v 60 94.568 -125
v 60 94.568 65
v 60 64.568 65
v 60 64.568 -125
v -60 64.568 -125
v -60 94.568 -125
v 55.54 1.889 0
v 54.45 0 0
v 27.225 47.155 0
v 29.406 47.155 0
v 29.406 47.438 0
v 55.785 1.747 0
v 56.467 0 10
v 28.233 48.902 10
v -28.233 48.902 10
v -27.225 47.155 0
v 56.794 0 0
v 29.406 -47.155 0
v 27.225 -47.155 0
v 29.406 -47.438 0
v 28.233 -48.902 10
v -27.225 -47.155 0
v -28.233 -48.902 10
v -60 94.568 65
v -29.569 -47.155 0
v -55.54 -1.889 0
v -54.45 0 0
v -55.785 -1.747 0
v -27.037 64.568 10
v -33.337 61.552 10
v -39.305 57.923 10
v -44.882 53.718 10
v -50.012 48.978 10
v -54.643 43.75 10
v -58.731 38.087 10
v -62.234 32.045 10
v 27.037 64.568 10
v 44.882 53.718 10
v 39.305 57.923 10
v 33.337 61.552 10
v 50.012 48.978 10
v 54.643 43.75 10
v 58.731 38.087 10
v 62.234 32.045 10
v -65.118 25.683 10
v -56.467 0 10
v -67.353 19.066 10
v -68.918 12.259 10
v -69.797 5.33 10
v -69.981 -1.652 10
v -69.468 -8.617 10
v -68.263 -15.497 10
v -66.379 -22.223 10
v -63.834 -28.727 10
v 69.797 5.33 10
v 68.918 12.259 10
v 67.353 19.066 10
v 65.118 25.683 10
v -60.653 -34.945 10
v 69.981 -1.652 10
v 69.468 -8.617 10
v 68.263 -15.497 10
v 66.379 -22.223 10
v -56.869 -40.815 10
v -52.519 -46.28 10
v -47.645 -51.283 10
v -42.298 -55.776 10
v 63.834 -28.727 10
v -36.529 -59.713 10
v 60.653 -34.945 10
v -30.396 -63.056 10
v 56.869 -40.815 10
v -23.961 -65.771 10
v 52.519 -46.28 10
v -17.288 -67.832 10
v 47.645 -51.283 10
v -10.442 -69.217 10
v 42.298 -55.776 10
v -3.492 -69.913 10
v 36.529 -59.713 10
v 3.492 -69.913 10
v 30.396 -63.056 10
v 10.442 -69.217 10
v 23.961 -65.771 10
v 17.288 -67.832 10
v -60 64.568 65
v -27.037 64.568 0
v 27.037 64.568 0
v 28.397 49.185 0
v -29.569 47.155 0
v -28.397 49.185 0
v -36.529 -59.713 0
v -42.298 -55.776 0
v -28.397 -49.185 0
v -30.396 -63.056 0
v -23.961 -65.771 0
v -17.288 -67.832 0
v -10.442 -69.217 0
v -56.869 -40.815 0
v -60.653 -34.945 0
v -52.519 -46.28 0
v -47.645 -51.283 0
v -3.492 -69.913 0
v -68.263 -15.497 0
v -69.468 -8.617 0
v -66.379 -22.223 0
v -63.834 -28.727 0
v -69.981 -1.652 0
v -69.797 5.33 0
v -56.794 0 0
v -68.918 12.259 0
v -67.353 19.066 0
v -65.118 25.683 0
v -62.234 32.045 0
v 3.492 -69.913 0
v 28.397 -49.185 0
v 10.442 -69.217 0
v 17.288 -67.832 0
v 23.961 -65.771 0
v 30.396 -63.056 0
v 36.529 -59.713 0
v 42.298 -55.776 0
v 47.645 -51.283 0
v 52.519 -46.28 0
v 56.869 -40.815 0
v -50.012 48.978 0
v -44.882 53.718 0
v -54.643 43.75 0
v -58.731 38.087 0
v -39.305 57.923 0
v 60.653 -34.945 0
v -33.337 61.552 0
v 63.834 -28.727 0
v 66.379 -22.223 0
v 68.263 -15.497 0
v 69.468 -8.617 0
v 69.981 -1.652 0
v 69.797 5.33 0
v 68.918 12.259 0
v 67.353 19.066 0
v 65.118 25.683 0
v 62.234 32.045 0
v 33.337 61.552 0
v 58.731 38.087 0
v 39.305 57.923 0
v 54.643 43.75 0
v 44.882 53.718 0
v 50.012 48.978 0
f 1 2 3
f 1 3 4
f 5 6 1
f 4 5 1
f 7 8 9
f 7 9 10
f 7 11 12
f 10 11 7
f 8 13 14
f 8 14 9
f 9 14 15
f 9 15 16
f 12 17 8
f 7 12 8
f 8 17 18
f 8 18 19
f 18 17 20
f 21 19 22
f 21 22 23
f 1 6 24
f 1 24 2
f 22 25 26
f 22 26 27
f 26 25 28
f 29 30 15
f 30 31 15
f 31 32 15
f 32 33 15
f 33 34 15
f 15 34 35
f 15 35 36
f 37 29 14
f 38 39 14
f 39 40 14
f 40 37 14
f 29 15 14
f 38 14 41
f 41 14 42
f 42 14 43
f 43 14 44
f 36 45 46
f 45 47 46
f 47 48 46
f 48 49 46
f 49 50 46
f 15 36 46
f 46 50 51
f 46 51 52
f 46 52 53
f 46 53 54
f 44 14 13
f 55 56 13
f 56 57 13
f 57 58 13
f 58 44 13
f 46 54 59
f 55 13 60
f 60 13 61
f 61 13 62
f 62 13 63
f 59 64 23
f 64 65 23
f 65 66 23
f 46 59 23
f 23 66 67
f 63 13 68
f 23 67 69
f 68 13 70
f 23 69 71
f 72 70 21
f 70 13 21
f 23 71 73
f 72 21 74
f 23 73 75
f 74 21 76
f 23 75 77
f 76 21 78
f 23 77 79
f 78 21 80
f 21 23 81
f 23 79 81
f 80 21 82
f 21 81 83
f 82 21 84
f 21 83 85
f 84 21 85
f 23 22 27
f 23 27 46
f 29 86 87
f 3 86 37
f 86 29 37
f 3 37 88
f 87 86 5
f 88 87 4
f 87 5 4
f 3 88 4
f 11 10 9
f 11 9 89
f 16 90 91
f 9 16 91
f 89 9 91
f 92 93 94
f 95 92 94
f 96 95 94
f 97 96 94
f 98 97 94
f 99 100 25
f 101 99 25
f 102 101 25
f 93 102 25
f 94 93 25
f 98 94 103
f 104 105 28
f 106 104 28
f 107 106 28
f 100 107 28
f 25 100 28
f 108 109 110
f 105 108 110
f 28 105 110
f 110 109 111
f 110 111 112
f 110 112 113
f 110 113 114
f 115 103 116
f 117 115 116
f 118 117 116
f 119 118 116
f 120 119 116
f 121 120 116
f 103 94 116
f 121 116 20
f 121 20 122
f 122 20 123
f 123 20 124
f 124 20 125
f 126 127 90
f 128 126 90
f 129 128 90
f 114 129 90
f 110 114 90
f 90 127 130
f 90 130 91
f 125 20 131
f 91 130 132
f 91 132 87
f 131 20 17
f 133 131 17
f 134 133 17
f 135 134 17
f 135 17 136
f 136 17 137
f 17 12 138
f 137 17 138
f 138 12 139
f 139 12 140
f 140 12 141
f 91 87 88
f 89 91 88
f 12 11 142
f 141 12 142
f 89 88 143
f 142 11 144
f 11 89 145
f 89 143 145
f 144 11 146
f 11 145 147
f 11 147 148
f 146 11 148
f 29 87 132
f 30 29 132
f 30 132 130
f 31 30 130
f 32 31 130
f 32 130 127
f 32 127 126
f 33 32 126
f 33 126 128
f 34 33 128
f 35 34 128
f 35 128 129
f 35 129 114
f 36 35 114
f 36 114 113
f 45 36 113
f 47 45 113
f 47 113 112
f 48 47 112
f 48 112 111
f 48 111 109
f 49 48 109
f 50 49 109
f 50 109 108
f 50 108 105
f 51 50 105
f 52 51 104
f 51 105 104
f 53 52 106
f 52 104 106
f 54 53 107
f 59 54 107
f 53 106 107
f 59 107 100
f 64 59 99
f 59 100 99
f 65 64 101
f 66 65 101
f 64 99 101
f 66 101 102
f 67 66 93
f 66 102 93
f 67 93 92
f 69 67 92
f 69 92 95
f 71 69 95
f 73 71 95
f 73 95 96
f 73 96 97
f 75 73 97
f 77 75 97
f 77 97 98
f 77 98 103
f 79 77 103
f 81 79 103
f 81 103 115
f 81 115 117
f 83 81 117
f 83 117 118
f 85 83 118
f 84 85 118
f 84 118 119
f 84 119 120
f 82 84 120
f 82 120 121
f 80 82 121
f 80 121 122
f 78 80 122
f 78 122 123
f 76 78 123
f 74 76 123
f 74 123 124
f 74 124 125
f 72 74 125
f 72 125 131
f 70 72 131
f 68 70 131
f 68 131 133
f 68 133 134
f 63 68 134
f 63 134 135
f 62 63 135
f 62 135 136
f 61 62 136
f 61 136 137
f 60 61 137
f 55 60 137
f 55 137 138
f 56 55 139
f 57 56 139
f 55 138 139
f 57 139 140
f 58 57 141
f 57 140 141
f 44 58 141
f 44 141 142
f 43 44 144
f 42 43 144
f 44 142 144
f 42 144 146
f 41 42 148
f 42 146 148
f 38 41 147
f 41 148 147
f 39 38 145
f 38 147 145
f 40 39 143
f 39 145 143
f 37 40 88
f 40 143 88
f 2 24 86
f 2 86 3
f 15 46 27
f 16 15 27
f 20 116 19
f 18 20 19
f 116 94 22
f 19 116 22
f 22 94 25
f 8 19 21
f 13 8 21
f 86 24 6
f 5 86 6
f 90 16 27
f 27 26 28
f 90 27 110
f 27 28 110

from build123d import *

# Parameters (mm, degrees)
ESQUISSE1_R               = 70
BOSS_EXTRU_1_DEPTH        = 10
CHANFREIN1_SIZE           = 10.000000024
CHANFREIN1_SIZE_2         = 1.74707794
D_PLACER_START            = -32.160153846
D_PLACER_LA_FACE1_DEPTH   = 61.565802755
D_PLACER_START_2          = -29.405648909
D_PLACER_LA_FACE1_2_DEPTH = 58.811297818
D_PLACER_LA_FACE1_3_DEPTH = 58.811297818
ESQUISSE2_W               = 120
ESQUISSE2_H               = 190
BOSS_EXTRU_2_DEPTH        = 30


with BuildPart() as part:
    # Esquisse1 → Boss.-Extru.1 (new body)
    with BuildSketch(Plane.XY):
        Circle(ESQUISSE1_R)
        Polygon((56.79394598, 0), (28.39697299, 49.185), (-28.39697299, 49.185), (-56.79394598, 0), (-28.39697299, -49.185), (28.39697299, -49.185), align=None, mode=Mode.SUBTRACT)
    extrude(amount=BOSS_EXTRU_1_DEPTH)

    # Chanfrein1
    # the kernel refuses this chamfer: 10.000000024, 1.74707794 mm, written as the material it takes off along each edge
    with BuildSketch(Plane(origin=(-54.38262227, -49.185, 10), x_dir=(0, 0, -1), z_dir=(1, 0, 0))) as chanfrein1_piece_1_section:
        Polygon((CHANFREIN1_SIZE, 0), (0, -CHANFREIN1_SIZE_2), (0, 0), align=None)
    chanfrein1_piece_1 = extrude(amount=108.76524454, mode=Mode.PRIVATE)
    chanfrein1_piece_1 = split(chanfrein1_piece_1, bisect_by=Plane(origin=(7.702074175, -85.029616205, 10), z_dir=(-0.8660254037844389, 0.4999999999999996, 0)), keep=Keep.TOP, mode=Mode.PRIVATE)
    chanfrein1_piece_1 = split(chanfrein1_piece_1, bisect_by=Plane(origin=(-34.89338531, -37.932883795, 10), z_dir=(0.8660254037844386, 0.5000000000000001, 0)), keep=Keep.TOP, mode=Mode.PRIVATE)
    add(chanfrein1_piece_1, mode=Mode.SUBTRACT)
    with BuildSketch(Plane(origin=(15.40414835, -71.68923241, 10), x_dir=(0, 0, -1), z_dir=(0.4999999999999996, 0.8660254037844389, 0))) as chanfrein1_piece_2_section:
        Polygon((CHANFREIN1_SIZE, 0), (0, -CHANFREIN1_SIZE_2), (0, 0), align=None)
    chanfrein1_piece_2 = extrude(amount=108.76524454, mode=Mode.PRIVATE)
    chanfrein1_piece_2 = split(chanfrein1_piece_2, bisect_by=Plane(origin=(15.40414835, -49.185, 10), z_dir=(0, 1, 0)), keep=Keep.TOP, mode=Mode.PRIVATE)
    chanfrein1_piece_2 = split(chanfrein1_piece_2, bisect_by=Plane(origin=(77.488844795, -35.844616205, 10), z_dir=(-0.8660254037844386, -0.5000000000000001, 0)), keep=Keep.TOP, mode=Mode.PRIVATE)
    add(chanfrein1_piece_2, mode=Mode.SUBTRACT)
    with BuildSketch(Plane(origin=(69.78677062, -22.50423241, 10), x_dir=(0, 0, -1), z_dir=(-0.5000000000000001, 0.8660254037844386, 0))) as chanfrein1_piece_3_section:
        Polygon((CHANFREIN1_SIZE, 0), (0, -CHANFREIN1_SIZE_2), (0, 0), align=None)
    chanfrein1_piece_3 = extrude(amount=108.76524454, mode=Mode.PRIVATE)
    chanfrein1_piece_3 = split(chanfrein1_piece_3, bisect_by=Plane(origin=(50.29753366, -11.252116205, 10), z_dir=(-0.8660254037844389, 0.4999999999999996, 0)), keep=Keep.TOP, mode=Mode.PRIVATE)
    chanfrein1_piece_3 = split(chanfrein1_piece_3, bisect_by=Plane(origin=(69.78677062, 49.185, 10), z_dir=(0, -1, 0)), keep=Keep.TOP, mode=Mode.PRIVATE)
    add(chanfrein1_piece_3, mode=Mode.SUBTRACT)
    with BuildSketch(Plane(origin=(54.38262227, 49.185, 10), x_dir=(0, 0, -1), z_dir=(-1, 0, 0))) as chanfrein1_piece_4_section:
        Polygon((CHANFREIN1_SIZE, 0), (0, -CHANFREIN1_SIZE_2), (0, 0), align=None)
    chanfrein1_piece_4 = extrude(amount=108.76524454, mode=Mode.PRIVATE)
    chanfrein1_piece_4 = split(chanfrein1_piece_4, bisect_by=Plane(origin=(-7.702074175, 85.029616205, 10), z_dir=(0.8660254037844388, -0.4999999999999998, 0)), keep=Keep.TOP, mode=Mode.PRIVATE)
    chanfrein1_piece_4 = split(chanfrein1_piece_4, bisect_by=Plane(origin=(34.89338531, 37.932883795, 10), z_dir=(-0.8660254037844386, -0.5000000000000001, 0)), keep=Keep.TOP, mode=Mode.PRIVATE)
    add(chanfrein1_piece_4, mode=Mode.SUBTRACT)
    with BuildSketch(Plane(origin=(-15.40414835, 71.68923241, 10), x_dir=(0, 0, -1), z_dir=(-0.4999999999999998, -0.8660254037844388, 0))) as chanfrein1_piece_5_section:
        Polygon((CHANFREIN1_SIZE, 0), (0, -CHANFREIN1_SIZE_2), (0, 0), align=None)
    chanfrein1_piece_5 = extrude(amount=108.76524454, mode=Mode.PRIVATE)
    chanfrein1_piece_5 = split(chanfrein1_piece_5, bisect_by=Plane(origin=(-77.488844795, 35.844616205, 10), z_dir=(0.8660254037844386, 0.5000000000000001, 0)), keep=Keep.TOP, mode=Mode.PRIVATE)
    chanfrein1_piece_5 = split(chanfrein1_piece_5, bisect_by=Plane(origin=(-15.40414835, 49.185, 10), z_dir=(0, -1, 0)), keep=Keep.TOP, mode=Mode.PRIVATE)
    add(chanfrein1_piece_5, mode=Mode.SUBTRACT)
    with BuildSketch(Plane(origin=(-69.78677062, 22.50423241, 10), x_dir=(0, 0, -1), z_dir=(0.5000000000000001, -0.8660254037844386, 0))) as chanfrein1_piece_6_section:
        Polygon((CHANFREIN1_SIZE, 0), (0, -CHANFREIN1_SIZE_2), (0, 0), align=None)
    chanfrein1_piece_6 = extrude(amount=108.76524454, mode=Mode.PRIVATE)
    chanfrein1_piece_6 = split(chanfrein1_piece_6, bisect_by=Plane(origin=(-69.78677062, -49.185, 10), z_dir=(0, 1, 0)), keep=Keep.TOP, mode=Mode.PRIVATE)
    chanfrein1_piece_6 = split(chanfrein1_piece_6, bisect_by=Plane(origin=(-50.29753366, 11.252116205, 10), z_dir=(0.8660254037844388, -0.4999999999999998, 0)), keep=Keep.TOP, mode=Mode.PRIVATE)
    add(chanfrein1_piece_6, mode=Mode.SUBTRACT)
    with BuildSketch(Plane(origin=(-54.38262227, -49.185, 10), x_dir=(0, 0, -1), z_dir=(1, 0, 0))) as chanfrein1_piece_7a_section:
        Polygon((CHANFREIN1_SIZE, 0), (0, -CHANFREIN1_SIZE_2), (0, 0), align=None)
    chanfrein1_piece_7a = extrude(amount=108.76524454, mode=Mode.PRIVATE)
    chanfrein1_piece_7a = split(chanfrein1_piece_7a, bisect_by=Plane(origin=(-34.89338531, -37.932883795, 10), z_dir=(-0.8660254037844386, -0.5000000000000001, 0)), keep=Keep.TOP, mode=Mode.PRIVATE)
    with BuildSketch(Plane(origin=(-69.78677062, 22.50423241, 10), x_dir=(0, 0, -1), z_dir=(0.5000000000000001, -0.8660254037844386, 0))) as chanfrein1_piece_7b_section:
        Polygon((CHANFREIN1_SIZE, 0), (0, -CHANFREIN1_SIZE_2), (0, 0), align=None)
    chanfrein1_piece_7b = extrude(amount=108.76524454, mode=Mode.PRIVATE)
    chanfrein1_piece_7b = split(chanfrein1_piece_7b, bisect_by=Plane(origin=(-69.78677062, -49.185, 10), z_dir=(0, -1, 0)), keep=Keep.TOP, mode=Mode.PRIVATE)
    chanfrein1_piece_7 = chanfrein1_piece_7a & chanfrein1_piece_7b
    add(chanfrein1_piece_7, mode=Mode.SUBTRACT)
    with BuildSketch(Plane(origin=(15.40414835, -71.68923241, 10), x_dir=(0, 0, -1), z_dir=(0.4999999999999996, 0.8660254037844389, 0))) as chanfrein1_piece_8a_section:
        Polygon((CHANFREIN1_SIZE, 0), (0, -CHANFREIN1_SIZE_2), (0, 0), align=None)
    chanfrein1_piece_8a = extrude(amount=108.76524454, mode=Mode.PRIVATE)
    chanfrein1_piece_8a = split(chanfrein1_piece_8a, bisect_by=Plane(origin=(15.40414835, -49.185, 10), z_dir=(0, -1, 0)), keep=Keep.TOP, mode=Mode.PRIVATE)
    with BuildSketch(Plane(origin=(-54.38262227, -49.185, 10), x_dir=(0, 0, -1), z_dir=(1, 0, 0))) as chanfrein1_piece_8b_section:
        Polygon((CHANFREIN1_SIZE, 0), (0, -CHANFREIN1_SIZE_2), (0, 0), align=None)
    chanfrein1_piece_8b = extrude(amount=108.76524454, mode=Mode.PRIVATE)
    chanfrein1_piece_8b = split(chanfrein1_piece_8b, bisect_by=Plane(origin=(7.702074175, -85.029616205, 10), z_dir=(0.8660254037844389, -0.4999999999999996, 0)), keep=Keep.TOP, mode=Mode.PRIVATE)
    chanfrein1_piece_8 = chanfrein1_piece_8a & chanfrein1_piece_8b
    add(chanfrein1_piece_8, mode=Mode.SUBTRACT)
    with BuildSketch(Plane(origin=(15.40414835, -71.68923241, 10), x_dir=(0, 0, -1), z_dir=(0.4999999999999996, 0.8660254037844389, 0))) as chanfrein1_piece_9a_section:
        Polygon((CHANFREIN1_SIZE, 0), (0, -CHANFREIN1_SIZE_2), (0, 0), align=None)
    chanfrein1_piece_9a = extrude(amount=108.76524454, mode=Mode.PRIVATE)
    chanfrein1_piece_9a = split(chanfrein1_piece_9a, bisect_by=Plane(origin=(77.488844795, -35.844616205, 10), z_dir=(0.8660254037844386, 0.5000000000000001, 0)), keep=Keep.TOP, mode=Mode.PRIVATE)
    with BuildSketch(Plane(origin=(69.78677062, -22.50423241, 10), x_dir=(0, 0, -1), z_dir=(-0.5000000000000001, 0.8660254037844386, 0))) as chanfrein1_piece_9b_section:
        Polygon((CHANFREIN1_SIZE, 0), (0, -CHANFREIN1_SIZE_2), (0, 0), align=None)
    chanfrein1_piece_9b = extrude(amount=108.76524454, mode=Mode.PRIVATE)
    chanfrein1_piece_9b = split(chanfrein1_piece_9b, bisect_by=Plane(origin=(50.29753366, -11.252116205, 10), z_dir=(0.8660254037844389, -0.4999999999999996, 0)), keep=Keep.TOP, mode=Mode.PRIVATE)
    chanfrein1_piece_9 = chanfrein1_piece_9a & chanfrein1_piece_9b
    add(chanfrein1_piece_9, mode=Mode.SUBTRACT)
    with BuildSketch(Plane(origin=(54.38262227, 49.185, 10), x_dir=(0, 0, -1), z_dir=(-1, 0, 0))) as chanfrein1_piece_10a_section:
        Polygon((CHANFREIN1_SIZE, 0), (0, -CHANFREIN1_SIZE_2), (0, 0), align=None)
    chanfrein1_piece_10a = extrude(amount=108.76524454, mode=Mode.PRIVATE)
    chanfrein1_piece_10a = split(chanfrein1_piece_10a, bisect_by=Plane(origin=(34.89338531, 37.932883795, 10), z_dir=(0.8660254037844386, 0.5000000000000001, 0)), keep=Keep.TOP, mode=Mode.PRIVATE)
    with BuildSketch(Plane(origin=(69.78677062, -22.50423241, 10), x_dir=(0, 0, -1), z_dir=(-0.5000000000000001, 0.8660254037844386, 0))) as chanfrein1_piece_10b_section:
        Polygon((CHANFREIN1_SIZE, 0), (0, -CHANFREIN1_SIZE_2), (0, 0), align=None)
    chanfrein1_piece_10b = extrude(amount=108.76524454, mode=Mode.PRIVATE)
    chanfrein1_piece_10b = split(chanfrein1_piece_10b, bisect_by=Plane(origin=(69.78677062, 49.185, 10), z_dir=(0, 1, 0)), keep=Keep.TOP, mode=Mode.PRIVATE)
    chanfrein1_piece_10 = chanfrein1_piece_10a & chanfrein1_piece_10b
    add(chanfrein1_piece_10, mode=Mode.SUBTRACT)
    with BuildSketch(Plane(origin=(-15.40414835, 71.68923241, 10), x_dir=(0, 0, -1), z_dir=(-0.4999999999999998, -0.8660254037844388, 0))) as chanfrein1_piece_11a_section:
        Polygon((CHANFREIN1_SIZE, 0), (0, -CHANFREIN1_SIZE_2), (0, 0), align=None)
    chanfrein1_piece_11a = extrude(amount=108.76524454, mode=Mode.PRIVATE)
    chanfrein1_piece_11a = split(chanfrein1_piece_11a, bisect_by=Plane(origin=(-15.40414835, 49.185, 10), z_dir=(0, 1, 0)), keep=Keep.TOP, mode=Mode.PRIVATE)
    with BuildSketch(Plane(origin=(54.38262227, 49.185, 10), x_dir=(0, 0, -1), z_dir=(-1, 0, 0))) as chanfrein1_piece_11b_section:
        Polygon((CHANFREIN1_SIZE, 0), (0, -CHANFREIN1_SIZE_2), (0, 0), align=None)
    chanfrein1_piece_11b = extrude(amount=108.76524454, mode=Mode.PRIVATE)
    chanfrein1_piece_11b = split(chanfrein1_piece_11b, bisect_by=Plane(origin=(-7.702074175, 85.029616205, 10), z_dir=(-0.8660254037844388, 0.4999999999999998, 0)), keep=Keep.TOP, mode=Mode.PRIVATE)
    chanfrein1_piece_11 = chanfrein1_piece_11a & chanfrein1_piece_11b
    add(chanfrein1_piece_11, mode=Mode.SUBTRACT)
    with BuildSketch(Plane(origin=(-69.78677062, 22.50423241, 10), x_dir=(0, 0, -1), z_dir=(0.5000000000000001, -0.8660254037844386, 0))) as chanfrein1_piece_12a_section:
        Polygon((CHANFREIN1_SIZE, 0), (0, -CHANFREIN1_SIZE_2), (0, 0), align=None)
    chanfrein1_piece_12a = extrude(amount=108.76524454, mode=Mode.PRIVATE)
    chanfrein1_piece_12a = split(chanfrein1_piece_12a, bisect_by=Plane(origin=(-50.29753366, 11.252116205, 10), z_dir=(-0.8660254037844388, 0.4999999999999998, 0)), keep=Keep.TOP, mode=Mode.PRIVATE)
    with BuildSketch(Plane(origin=(-15.40414835, 71.68923241, 10), x_dir=(0, 0, -1), z_dir=(-0.4999999999999998, -0.8660254037844388, 0))) as chanfrein1_piece_12b_section:
        Polygon((CHANFREIN1_SIZE, 0), (0, -CHANFREIN1_SIZE_2), (0, 0), align=None)
    chanfrein1_piece_12b = extrude(amount=108.76524454, mode=Mode.PRIVATE)
    chanfrein1_piece_12b = split(chanfrein1_piece_12b, bisect_by=Plane(origin=(-77.488844795, 35.844616205, 10), z_dir=(-0.8660254037844386, -0.5000000000000001, 0)), keep=Keep.TOP, mode=Mode.PRIVATE)
    chanfrein1_piece_12 = chanfrein1_piece_12a & chanfrein1_piece_12b
    add(chanfrein1_piece_12, mode=Mode.SUBTRACT)

    # Déplacer la face1: read off the stored shape, not the designer's step
    # Déplacer la face1 outline → Déplacer la face1 (add)
    with BuildSketch(Plane.YZ.offset(D_PLACER_START)):
        Polygon((49.185000004, -1e-09), (50.93207794, 10), (48.901784549, 10), (47.154706614, 0), align=None)
        Polygon((-47.154706614, 0), (-48.901784549, 10), (-50.93207794, 10), (-49.185000004, -1e-09), align=None)
    extrude(amount=D_PLACER_LA_FACE1_DEPTH)

    # D_placer la face1 2 outline → D_placer la face1 2 (add)
    with BuildSketch(Plane(origin=(0, 0, 0), x_dir=(0.8660254037844389, -0.49999999999999956, 0), z_dir=(0.4999999999999996, 0.8660254037844388, 0)).offset(D_PLACER_START_2)):
        Polygon((-49.185000004, 1e-09), (-50.93207794, -10), (-48.901784549, -10), (-47.154706614, 0), align=None)
        Polygon((47.154706614, 0), (48.901784549, -10), (50.93207794, -10), (49.185000004, 1e-09), align=None)
    extrude(amount=D_PLACER_LA_FACE1_2_DEPTH)

    # D_placer la face1 3 outline → D_placer la face1 3 (add)
    with BuildSketch(Plane(origin=(0, 0, 0), x_dir=(0.8660254037844386, 0.5000000000000001, 0), z_dir=(0.5000000000000001, -0.8660254037844386, 0)).offset(D_PLACER_START_2)):
        Polygon((49.185000004, -1e-09), (50.93207794, 10), (48.901784549, 10), (47.154706614, 0), align=None)
        Polygon((-47.154706614, 0), (-48.901784549, 10), (-50.93207794, 10), (-49.185000004, -1e-09), align=None)
    extrude(amount=D_PLACER_LA_FACE1_3_DEPTH)

    # Esquisse2 → Boss.-Extru.2 (add)
    with BuildSketch(Plane(origin=(0, 94.56764827, 0), x_dir=(1, 0, 0), z_dir=(0, 1, 0))):
        with Locations((0, 30)):
            Rectangle(ESQUISSE2_W, ESQUISSE2_H)
    extrude(amount=-BOSS_EXTRU_2_DEPTH)


solid = part.part
